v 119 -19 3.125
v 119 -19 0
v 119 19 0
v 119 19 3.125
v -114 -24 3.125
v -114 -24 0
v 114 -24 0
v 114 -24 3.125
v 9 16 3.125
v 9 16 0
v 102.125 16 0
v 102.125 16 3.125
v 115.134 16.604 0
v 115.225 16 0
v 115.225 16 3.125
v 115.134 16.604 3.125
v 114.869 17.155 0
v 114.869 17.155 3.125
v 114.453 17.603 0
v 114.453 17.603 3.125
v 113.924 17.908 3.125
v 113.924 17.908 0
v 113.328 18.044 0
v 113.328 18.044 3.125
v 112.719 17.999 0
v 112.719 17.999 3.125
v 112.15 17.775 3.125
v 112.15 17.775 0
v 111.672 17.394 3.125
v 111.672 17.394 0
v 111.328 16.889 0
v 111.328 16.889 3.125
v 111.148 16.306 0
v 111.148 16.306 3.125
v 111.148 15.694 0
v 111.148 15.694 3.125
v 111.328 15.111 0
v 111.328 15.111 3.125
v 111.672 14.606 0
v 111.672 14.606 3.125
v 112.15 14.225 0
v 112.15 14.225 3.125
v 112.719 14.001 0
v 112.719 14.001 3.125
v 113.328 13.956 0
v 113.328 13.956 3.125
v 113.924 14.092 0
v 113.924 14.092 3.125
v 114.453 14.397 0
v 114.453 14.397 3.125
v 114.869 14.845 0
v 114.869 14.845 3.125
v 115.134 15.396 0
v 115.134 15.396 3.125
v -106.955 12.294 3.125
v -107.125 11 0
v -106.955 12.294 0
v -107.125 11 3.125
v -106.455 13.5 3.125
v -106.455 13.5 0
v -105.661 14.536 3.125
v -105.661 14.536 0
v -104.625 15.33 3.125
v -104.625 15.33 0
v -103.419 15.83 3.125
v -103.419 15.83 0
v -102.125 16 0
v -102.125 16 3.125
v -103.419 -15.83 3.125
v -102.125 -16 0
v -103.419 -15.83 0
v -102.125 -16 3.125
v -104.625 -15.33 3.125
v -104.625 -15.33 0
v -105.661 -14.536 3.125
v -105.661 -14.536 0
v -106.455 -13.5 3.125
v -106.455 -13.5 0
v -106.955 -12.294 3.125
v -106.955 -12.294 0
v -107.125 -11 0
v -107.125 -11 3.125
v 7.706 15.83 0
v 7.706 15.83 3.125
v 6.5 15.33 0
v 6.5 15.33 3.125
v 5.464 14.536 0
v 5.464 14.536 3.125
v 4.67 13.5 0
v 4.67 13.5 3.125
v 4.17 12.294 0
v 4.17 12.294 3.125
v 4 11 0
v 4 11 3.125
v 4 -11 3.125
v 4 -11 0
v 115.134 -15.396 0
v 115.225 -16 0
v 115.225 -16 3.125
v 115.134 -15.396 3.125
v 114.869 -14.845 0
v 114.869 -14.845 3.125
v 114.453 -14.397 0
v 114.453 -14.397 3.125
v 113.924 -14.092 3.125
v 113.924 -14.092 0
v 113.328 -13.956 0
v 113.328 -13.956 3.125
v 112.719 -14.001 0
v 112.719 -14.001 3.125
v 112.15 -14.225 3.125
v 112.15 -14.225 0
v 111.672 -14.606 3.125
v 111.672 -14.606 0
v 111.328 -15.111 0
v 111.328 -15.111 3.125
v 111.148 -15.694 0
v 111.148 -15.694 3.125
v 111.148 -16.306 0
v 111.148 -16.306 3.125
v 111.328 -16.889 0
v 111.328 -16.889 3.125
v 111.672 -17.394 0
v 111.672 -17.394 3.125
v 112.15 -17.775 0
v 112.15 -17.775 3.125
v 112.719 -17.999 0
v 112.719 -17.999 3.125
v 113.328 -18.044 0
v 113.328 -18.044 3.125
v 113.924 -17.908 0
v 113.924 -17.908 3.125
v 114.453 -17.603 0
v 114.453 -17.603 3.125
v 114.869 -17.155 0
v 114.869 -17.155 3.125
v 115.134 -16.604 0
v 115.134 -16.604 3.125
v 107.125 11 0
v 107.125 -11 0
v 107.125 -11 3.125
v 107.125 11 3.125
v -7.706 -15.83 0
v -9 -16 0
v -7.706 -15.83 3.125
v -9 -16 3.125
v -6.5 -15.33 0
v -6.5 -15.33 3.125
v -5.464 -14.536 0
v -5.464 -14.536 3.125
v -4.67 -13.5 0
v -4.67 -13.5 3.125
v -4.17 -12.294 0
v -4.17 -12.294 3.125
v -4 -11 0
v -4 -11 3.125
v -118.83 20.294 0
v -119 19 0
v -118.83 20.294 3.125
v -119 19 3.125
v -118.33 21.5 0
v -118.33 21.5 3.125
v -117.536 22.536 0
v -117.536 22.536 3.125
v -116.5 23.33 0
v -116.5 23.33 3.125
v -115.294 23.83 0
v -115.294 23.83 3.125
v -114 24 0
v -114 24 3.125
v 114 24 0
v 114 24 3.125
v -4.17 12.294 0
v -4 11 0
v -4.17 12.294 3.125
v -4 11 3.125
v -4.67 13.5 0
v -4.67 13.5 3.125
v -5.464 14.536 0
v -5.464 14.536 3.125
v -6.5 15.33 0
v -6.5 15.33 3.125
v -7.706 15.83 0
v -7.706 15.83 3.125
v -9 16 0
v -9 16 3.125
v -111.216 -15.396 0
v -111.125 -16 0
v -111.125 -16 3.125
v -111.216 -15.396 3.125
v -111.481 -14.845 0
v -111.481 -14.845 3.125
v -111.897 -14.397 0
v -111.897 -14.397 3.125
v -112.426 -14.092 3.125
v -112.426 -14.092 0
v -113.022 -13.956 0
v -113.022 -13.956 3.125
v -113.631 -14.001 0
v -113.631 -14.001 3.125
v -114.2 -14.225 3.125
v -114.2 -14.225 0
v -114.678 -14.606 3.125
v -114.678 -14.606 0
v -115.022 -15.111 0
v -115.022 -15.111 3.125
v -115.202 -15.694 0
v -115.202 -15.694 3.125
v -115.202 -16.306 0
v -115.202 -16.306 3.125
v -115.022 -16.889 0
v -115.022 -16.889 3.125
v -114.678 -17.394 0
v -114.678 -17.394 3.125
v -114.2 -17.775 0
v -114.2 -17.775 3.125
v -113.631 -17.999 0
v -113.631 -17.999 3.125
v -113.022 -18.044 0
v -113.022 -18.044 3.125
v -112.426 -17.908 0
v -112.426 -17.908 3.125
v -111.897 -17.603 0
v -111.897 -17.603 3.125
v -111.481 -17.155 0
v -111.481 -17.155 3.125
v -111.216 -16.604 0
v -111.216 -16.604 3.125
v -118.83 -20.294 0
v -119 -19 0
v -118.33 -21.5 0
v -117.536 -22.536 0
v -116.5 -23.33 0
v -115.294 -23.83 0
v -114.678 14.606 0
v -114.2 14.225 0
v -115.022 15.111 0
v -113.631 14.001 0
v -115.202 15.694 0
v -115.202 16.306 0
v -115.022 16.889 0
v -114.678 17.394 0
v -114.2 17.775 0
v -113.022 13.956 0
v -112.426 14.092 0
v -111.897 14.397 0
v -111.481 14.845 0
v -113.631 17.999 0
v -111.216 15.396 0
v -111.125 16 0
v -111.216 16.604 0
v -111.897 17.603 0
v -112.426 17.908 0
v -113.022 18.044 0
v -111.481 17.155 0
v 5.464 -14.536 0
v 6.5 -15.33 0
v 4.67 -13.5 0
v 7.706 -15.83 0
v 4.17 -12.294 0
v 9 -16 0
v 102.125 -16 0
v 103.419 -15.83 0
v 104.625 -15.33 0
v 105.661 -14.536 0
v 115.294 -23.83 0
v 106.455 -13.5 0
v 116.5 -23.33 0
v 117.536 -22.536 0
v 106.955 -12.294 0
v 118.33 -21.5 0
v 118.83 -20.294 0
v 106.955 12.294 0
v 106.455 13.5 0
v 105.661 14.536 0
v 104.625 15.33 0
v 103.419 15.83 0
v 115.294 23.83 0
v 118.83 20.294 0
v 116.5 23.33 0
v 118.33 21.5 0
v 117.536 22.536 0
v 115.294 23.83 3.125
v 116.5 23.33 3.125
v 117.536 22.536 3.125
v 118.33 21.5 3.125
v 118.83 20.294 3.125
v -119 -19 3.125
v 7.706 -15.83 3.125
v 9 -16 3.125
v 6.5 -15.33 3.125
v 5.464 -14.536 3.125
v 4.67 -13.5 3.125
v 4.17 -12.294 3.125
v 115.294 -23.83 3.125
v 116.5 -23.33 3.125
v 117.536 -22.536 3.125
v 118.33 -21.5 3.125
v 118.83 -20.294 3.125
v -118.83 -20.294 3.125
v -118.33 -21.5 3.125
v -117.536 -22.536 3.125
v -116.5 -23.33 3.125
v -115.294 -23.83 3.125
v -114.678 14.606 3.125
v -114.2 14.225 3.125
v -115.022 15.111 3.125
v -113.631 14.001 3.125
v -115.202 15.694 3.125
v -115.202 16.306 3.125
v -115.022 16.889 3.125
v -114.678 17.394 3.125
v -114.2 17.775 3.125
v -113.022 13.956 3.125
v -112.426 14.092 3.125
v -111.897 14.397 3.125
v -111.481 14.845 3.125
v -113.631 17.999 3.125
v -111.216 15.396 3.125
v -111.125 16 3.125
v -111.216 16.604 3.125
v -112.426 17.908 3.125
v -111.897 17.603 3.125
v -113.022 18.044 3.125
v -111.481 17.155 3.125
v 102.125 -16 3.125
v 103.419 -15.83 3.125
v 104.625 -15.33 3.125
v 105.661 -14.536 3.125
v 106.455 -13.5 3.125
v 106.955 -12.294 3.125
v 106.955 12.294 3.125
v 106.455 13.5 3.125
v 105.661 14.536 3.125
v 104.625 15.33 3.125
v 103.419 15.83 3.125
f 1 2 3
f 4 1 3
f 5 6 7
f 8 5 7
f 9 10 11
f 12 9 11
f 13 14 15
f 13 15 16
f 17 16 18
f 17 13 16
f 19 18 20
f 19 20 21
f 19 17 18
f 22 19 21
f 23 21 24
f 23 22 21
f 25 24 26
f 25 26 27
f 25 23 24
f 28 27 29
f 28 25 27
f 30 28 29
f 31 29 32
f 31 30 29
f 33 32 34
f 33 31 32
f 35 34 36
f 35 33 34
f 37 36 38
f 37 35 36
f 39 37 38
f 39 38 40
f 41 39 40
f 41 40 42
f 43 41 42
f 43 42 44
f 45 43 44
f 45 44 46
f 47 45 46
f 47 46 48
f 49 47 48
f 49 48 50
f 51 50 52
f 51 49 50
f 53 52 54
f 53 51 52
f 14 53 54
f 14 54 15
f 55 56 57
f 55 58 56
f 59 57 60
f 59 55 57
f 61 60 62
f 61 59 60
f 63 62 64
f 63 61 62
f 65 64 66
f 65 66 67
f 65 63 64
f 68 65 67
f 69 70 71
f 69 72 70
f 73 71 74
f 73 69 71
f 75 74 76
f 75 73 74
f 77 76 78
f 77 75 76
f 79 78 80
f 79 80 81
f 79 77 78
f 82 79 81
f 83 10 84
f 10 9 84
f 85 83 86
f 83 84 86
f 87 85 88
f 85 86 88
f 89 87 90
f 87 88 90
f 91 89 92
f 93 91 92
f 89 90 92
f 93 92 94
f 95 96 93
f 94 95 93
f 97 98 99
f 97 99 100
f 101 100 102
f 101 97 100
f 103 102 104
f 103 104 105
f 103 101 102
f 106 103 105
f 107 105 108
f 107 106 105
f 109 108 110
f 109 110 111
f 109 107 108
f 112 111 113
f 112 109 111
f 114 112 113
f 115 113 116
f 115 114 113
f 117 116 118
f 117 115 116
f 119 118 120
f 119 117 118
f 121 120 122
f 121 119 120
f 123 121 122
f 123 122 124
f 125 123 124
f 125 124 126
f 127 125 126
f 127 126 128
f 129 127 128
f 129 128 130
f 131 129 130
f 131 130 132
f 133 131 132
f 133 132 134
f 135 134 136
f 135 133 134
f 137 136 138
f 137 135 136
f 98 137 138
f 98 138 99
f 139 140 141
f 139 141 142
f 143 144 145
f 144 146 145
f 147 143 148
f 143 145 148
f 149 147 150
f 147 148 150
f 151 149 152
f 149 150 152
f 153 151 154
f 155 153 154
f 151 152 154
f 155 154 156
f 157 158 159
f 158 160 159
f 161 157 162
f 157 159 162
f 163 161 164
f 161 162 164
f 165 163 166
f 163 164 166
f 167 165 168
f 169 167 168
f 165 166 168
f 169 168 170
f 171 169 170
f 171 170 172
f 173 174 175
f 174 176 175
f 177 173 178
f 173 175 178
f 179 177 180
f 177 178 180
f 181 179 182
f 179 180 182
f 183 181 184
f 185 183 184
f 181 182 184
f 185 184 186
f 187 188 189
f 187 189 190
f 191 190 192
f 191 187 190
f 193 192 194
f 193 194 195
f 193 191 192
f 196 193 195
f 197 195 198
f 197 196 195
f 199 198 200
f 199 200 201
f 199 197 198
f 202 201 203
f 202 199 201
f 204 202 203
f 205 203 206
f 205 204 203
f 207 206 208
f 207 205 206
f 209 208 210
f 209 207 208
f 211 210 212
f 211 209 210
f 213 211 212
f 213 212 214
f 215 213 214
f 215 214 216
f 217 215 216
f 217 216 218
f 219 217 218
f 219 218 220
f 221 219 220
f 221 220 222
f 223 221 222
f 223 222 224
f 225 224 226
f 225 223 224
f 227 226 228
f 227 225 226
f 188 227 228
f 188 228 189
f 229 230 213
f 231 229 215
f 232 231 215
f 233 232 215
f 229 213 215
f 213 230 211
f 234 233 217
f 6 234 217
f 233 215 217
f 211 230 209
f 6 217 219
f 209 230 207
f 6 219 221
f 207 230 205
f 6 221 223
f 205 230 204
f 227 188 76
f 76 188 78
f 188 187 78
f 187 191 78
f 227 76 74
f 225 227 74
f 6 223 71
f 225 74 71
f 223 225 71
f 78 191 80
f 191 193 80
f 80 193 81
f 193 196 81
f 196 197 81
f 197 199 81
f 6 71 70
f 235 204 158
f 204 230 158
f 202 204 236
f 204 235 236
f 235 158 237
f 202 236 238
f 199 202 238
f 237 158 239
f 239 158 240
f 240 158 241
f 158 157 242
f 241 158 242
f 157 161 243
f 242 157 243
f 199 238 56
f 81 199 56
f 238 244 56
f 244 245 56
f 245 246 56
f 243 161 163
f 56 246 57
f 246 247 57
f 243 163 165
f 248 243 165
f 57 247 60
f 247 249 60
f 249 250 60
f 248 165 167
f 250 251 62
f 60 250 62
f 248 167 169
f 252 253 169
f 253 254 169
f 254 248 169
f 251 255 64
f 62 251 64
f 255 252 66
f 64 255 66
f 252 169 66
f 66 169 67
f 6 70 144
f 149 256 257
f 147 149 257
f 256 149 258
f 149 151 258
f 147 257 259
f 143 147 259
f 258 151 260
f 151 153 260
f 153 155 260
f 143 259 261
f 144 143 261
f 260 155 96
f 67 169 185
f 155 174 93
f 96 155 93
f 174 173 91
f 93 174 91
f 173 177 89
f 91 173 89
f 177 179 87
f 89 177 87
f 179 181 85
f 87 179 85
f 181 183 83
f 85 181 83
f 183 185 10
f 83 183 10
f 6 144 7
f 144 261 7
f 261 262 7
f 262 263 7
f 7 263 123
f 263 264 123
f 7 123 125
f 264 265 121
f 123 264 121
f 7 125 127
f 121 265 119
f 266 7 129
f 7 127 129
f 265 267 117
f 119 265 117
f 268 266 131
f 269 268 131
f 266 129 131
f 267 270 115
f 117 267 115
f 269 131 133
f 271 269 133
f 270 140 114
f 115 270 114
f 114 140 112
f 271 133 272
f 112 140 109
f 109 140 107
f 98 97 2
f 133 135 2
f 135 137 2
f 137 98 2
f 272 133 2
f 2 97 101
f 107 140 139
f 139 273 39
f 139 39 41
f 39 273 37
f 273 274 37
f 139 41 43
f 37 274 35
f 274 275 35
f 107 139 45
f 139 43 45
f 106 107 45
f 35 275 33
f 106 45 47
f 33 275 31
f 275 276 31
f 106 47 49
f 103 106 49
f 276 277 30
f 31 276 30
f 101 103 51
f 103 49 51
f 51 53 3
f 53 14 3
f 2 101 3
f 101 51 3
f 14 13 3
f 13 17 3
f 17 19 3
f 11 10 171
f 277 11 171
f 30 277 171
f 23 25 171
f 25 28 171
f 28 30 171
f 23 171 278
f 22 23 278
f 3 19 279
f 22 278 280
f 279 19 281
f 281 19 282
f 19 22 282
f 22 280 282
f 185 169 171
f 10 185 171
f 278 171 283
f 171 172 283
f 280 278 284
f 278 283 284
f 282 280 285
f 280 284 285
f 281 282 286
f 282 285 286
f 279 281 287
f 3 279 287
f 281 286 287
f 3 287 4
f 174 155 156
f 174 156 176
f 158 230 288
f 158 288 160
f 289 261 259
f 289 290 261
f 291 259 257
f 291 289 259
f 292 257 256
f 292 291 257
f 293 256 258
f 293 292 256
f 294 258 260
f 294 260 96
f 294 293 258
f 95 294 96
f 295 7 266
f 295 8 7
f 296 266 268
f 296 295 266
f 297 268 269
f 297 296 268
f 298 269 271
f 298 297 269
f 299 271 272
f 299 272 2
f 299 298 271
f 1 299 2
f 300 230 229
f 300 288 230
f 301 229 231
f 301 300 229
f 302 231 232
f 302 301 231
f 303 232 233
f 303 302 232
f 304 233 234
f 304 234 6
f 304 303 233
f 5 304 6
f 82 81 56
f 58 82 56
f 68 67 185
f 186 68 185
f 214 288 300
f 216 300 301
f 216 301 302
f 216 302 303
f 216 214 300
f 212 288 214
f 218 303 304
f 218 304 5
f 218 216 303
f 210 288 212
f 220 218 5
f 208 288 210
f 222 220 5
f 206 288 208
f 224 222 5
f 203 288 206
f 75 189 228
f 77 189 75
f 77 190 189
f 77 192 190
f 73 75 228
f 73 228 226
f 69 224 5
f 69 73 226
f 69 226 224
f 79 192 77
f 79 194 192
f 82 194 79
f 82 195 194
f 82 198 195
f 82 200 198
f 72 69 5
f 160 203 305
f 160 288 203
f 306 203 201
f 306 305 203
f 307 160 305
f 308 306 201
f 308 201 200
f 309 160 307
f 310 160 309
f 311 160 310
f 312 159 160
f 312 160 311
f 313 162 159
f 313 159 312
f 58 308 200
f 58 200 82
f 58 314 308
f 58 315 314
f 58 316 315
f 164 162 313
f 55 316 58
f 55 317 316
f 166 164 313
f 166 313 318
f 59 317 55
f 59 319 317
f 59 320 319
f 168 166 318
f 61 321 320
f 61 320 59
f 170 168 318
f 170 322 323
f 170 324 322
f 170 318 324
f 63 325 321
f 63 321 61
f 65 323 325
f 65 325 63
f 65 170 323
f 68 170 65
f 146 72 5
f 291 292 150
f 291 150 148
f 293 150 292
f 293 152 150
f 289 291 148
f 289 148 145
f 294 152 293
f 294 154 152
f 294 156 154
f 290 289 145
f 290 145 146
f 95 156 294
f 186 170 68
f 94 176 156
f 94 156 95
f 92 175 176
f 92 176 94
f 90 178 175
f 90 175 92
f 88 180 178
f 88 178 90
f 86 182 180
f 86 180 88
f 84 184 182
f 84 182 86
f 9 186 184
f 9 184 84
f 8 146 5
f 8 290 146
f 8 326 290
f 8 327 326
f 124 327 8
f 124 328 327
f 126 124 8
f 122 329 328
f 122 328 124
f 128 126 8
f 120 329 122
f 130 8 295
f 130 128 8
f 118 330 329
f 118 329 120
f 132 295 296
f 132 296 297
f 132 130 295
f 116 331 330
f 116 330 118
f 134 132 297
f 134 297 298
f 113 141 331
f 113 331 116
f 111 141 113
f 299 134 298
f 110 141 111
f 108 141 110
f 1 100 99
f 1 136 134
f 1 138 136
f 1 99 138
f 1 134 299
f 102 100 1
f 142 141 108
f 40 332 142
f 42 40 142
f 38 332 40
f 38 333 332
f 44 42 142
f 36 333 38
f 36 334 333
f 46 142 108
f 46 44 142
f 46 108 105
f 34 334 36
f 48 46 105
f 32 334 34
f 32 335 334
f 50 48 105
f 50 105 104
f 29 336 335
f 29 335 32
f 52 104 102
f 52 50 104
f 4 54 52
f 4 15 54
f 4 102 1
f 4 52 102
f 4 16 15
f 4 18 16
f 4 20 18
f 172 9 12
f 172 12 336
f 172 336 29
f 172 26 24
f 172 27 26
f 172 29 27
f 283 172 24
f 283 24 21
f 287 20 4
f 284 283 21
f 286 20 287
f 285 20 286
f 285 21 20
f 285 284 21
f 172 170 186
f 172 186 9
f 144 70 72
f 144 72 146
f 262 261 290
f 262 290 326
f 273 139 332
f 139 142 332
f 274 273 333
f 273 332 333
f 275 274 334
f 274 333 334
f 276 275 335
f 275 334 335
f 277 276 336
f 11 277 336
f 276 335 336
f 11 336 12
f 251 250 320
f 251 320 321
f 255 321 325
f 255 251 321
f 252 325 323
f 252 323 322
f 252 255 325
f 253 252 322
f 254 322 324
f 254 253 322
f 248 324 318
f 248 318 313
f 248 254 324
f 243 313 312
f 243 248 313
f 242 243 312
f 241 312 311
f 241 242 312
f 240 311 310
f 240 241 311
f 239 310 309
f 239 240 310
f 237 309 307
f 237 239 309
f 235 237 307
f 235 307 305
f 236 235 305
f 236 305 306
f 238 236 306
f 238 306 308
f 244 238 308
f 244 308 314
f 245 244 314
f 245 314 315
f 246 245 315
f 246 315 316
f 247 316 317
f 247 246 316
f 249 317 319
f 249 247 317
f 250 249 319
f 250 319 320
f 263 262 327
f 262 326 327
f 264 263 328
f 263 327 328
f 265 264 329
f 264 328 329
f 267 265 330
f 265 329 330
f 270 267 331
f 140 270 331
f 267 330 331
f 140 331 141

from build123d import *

# Parameters (mm, degrees)
SKETCH1_W           = 238
SKETCH1_H           = 48
SKETCH1_R           = 2.05
SKETCH1_W_2         = 103.125
SKETCH1_H_2         = 32
BOSS_EXTRUDE1_DEPTH = 3.125
FILLET1_R           = 5


with BuildPart() as part:
    # Sketch1 → Boss-Extrude1 (new body)
    with BuildSketch(Plane.XY):
        Rectangle(SKETCH1_W, SKETCH1_H)
        with Locations((-113.175, 16)):
            Circle(SKETCH1_R, mode=Mode.SUBTRACT)
        with Locations((-113.175, -16)):
            Circle(SKETCH1_R, mode=Mode.SUBTRACT)
        with Locations((113.175, 16)):
            Circle(SKETCH1_R, mode=Mode.SUBTRACT)
        with Locations((113.175, -16)):
            Circle(SKETCH1_R, mode=Mode.SUBTRACT)
        with Locations((-55.5625, 0)):
            Rectangle(SKETCH1_W_2, SKETCH1_H_2, mode=Mode.SUBTRACT)
        with Locations((55.5625, 0)):
            Rectangle(SKETCH1_W_2, SKETCH1_H_2, mode=Mode.SUBTRACT)
    extrude(amount=BOSS_EXTRUDE1_DEPTH)

    # Fillet1
    fillet1_edges = [part.edges().sort_by_distance(p)[0] for p in [
        (-107.125, 16, 1.5625),
        (-107.125, -16, 1.5625),
        (-4, -16, 1.5625),
        (-4, 16, 1.5625),
        (107.125, -16, 1.5625),
        (107.125, 16, 1.5625),
        (4, 16, 1.5625),
        (4, -16, 1.5625),
        (-119, 24, 1.5625),
        (119, 24, 1.5625),
        (119, -24, 1.5625),
        (-119, -24, 1.5625),
    ]]
    fillet(fillet1_edges, radius=FILLET1_R)


solid = part.part
